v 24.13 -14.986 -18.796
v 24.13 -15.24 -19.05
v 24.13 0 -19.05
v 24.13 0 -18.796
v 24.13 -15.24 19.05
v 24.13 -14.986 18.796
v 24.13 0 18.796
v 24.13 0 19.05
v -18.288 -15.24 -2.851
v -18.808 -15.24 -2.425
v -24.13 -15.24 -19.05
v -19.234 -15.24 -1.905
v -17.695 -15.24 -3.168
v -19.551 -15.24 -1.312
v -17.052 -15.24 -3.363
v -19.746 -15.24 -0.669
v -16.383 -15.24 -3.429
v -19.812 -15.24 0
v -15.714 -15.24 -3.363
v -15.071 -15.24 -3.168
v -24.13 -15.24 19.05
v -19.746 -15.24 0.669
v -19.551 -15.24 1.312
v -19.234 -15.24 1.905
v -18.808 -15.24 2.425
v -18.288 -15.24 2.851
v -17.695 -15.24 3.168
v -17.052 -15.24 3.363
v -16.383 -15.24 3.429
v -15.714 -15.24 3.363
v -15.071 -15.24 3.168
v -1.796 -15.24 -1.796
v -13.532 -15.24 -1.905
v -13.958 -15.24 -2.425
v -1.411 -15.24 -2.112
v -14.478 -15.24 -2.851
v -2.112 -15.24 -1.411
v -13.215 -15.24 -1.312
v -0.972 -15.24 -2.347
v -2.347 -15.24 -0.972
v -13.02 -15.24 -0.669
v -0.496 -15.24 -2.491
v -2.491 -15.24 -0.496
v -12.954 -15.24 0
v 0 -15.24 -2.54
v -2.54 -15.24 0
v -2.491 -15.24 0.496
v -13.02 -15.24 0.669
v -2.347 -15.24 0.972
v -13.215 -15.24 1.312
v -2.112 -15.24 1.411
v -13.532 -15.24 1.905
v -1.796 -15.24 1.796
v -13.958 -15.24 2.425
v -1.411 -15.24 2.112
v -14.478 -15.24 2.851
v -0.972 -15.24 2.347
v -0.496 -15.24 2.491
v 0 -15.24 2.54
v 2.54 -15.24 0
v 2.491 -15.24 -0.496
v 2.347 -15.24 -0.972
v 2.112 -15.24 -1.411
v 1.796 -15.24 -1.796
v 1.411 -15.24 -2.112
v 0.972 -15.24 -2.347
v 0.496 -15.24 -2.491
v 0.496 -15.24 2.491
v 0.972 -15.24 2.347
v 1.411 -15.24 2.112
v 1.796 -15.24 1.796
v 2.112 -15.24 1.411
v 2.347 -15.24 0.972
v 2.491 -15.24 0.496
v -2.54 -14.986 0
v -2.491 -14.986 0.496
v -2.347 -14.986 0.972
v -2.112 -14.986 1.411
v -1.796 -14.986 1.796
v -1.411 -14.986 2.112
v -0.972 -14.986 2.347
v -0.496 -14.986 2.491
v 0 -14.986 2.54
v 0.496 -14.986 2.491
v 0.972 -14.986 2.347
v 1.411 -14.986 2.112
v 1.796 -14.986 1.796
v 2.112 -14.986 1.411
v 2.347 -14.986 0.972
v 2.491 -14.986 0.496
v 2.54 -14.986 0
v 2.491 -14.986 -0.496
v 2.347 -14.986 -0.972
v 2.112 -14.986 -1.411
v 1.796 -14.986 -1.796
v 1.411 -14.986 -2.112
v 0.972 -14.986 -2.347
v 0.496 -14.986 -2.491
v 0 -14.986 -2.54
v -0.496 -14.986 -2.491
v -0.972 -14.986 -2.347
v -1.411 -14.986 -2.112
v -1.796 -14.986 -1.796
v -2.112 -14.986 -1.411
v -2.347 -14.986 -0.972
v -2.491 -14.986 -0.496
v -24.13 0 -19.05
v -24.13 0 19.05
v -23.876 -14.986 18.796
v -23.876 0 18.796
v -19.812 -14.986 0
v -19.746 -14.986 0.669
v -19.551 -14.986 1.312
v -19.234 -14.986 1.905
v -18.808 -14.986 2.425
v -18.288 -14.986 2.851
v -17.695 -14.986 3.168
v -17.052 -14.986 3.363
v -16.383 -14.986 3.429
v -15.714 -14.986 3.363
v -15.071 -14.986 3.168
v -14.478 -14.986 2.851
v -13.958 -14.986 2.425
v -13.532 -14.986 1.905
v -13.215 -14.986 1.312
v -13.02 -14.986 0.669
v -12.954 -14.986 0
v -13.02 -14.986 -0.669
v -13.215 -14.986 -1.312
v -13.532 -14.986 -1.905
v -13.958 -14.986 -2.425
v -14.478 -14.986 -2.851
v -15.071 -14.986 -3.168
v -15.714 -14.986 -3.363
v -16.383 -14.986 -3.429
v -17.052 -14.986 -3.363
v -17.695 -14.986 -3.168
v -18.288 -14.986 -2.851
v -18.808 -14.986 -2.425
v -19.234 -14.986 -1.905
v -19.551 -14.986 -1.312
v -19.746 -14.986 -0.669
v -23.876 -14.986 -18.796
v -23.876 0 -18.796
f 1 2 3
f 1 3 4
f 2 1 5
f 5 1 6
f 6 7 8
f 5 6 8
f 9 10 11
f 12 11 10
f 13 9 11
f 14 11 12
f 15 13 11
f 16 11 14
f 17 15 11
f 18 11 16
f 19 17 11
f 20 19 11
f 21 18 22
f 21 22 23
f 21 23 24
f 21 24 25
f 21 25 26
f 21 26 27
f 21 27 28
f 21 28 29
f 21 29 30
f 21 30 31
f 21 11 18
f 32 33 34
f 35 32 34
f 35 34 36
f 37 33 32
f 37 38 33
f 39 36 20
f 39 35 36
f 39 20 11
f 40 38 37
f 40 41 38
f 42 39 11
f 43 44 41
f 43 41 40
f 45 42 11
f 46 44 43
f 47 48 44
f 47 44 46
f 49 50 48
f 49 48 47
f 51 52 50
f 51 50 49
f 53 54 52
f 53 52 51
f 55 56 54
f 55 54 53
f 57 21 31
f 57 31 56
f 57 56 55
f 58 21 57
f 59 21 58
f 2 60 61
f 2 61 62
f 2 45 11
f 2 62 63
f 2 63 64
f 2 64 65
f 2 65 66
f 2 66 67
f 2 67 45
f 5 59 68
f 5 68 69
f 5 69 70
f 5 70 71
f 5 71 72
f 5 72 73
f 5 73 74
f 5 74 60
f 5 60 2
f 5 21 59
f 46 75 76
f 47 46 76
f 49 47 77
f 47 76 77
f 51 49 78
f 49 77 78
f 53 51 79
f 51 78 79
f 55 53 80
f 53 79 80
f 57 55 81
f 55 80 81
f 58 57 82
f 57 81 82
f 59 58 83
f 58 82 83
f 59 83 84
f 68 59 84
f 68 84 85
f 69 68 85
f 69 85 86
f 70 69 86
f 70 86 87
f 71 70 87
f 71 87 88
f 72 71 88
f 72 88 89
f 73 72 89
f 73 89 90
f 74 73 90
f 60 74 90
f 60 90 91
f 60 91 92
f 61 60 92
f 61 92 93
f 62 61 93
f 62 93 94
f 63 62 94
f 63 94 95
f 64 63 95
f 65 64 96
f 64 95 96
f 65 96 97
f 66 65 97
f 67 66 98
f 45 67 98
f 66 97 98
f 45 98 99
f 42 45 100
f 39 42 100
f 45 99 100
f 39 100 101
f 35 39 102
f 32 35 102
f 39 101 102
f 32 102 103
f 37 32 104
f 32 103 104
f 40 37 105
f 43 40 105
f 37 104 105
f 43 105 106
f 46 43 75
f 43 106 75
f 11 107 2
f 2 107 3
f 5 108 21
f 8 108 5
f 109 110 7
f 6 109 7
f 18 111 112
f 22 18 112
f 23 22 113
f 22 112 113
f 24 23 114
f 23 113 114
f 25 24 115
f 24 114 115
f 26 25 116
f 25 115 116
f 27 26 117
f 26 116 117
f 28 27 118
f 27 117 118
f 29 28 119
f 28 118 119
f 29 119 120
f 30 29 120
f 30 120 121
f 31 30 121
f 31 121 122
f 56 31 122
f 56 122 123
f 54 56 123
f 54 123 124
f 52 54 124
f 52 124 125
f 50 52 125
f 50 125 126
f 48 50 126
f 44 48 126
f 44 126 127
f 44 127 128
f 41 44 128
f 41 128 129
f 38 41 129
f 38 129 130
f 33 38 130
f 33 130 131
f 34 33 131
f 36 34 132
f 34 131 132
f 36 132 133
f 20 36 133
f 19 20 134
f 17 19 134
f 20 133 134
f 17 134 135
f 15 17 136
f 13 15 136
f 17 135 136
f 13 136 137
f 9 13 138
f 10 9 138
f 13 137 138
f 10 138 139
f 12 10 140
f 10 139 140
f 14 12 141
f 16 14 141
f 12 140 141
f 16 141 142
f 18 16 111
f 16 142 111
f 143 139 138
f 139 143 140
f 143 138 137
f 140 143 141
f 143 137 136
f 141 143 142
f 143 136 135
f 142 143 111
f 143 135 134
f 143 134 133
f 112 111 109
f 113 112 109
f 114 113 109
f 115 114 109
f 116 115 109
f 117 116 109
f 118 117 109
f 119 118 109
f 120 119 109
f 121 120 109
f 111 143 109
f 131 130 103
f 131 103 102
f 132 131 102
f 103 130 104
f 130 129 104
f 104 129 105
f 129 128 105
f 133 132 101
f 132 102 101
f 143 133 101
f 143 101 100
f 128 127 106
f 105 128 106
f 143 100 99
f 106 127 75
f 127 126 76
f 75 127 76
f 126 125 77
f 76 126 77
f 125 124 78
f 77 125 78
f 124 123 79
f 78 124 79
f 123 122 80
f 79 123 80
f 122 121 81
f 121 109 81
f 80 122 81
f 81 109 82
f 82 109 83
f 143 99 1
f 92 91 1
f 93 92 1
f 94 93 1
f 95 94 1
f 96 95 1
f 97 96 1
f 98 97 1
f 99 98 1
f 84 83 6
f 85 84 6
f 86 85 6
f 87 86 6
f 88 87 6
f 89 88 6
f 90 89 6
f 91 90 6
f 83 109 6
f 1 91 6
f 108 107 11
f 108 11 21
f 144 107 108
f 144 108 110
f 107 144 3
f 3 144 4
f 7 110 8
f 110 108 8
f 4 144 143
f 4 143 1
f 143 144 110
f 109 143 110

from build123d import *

# Parameters (mm, degrees)
F0_W     = 48.26
F0_H     = 38.1
F1_DEPTH = 15.24
F3_T     = -0.254
F4_D     = 6.858
F6_D     = 5.08


with BuildPart() as f1:
    # F0 (on Front) → F1 (new body)
    with BuildSketch(Plane.XZ):
        Rectangle(F0_W, F0_H)
    extrude(amount=F1_DEPTH)

    # F3
    f3_openings = [f1.faces().sort_by_distance(p)[0] for p in [
        (0, 0, 0),
        (24.13, -7.62, 0),
    ]]
    offset(amount=F3_T, openings=f3_openings)

    # F4 (through all)
    with Locations(Plane.XZ.offset(15.24)):
        with Locations((-16.383, 0)):
            Hole(F4_D / 2)

    # F6 (through all)
    with Locations(Plane.XZ.offset(15.24)):
        with Locations((0, 0)):
            Hole(F6_D / 2)


solid = f1.part
